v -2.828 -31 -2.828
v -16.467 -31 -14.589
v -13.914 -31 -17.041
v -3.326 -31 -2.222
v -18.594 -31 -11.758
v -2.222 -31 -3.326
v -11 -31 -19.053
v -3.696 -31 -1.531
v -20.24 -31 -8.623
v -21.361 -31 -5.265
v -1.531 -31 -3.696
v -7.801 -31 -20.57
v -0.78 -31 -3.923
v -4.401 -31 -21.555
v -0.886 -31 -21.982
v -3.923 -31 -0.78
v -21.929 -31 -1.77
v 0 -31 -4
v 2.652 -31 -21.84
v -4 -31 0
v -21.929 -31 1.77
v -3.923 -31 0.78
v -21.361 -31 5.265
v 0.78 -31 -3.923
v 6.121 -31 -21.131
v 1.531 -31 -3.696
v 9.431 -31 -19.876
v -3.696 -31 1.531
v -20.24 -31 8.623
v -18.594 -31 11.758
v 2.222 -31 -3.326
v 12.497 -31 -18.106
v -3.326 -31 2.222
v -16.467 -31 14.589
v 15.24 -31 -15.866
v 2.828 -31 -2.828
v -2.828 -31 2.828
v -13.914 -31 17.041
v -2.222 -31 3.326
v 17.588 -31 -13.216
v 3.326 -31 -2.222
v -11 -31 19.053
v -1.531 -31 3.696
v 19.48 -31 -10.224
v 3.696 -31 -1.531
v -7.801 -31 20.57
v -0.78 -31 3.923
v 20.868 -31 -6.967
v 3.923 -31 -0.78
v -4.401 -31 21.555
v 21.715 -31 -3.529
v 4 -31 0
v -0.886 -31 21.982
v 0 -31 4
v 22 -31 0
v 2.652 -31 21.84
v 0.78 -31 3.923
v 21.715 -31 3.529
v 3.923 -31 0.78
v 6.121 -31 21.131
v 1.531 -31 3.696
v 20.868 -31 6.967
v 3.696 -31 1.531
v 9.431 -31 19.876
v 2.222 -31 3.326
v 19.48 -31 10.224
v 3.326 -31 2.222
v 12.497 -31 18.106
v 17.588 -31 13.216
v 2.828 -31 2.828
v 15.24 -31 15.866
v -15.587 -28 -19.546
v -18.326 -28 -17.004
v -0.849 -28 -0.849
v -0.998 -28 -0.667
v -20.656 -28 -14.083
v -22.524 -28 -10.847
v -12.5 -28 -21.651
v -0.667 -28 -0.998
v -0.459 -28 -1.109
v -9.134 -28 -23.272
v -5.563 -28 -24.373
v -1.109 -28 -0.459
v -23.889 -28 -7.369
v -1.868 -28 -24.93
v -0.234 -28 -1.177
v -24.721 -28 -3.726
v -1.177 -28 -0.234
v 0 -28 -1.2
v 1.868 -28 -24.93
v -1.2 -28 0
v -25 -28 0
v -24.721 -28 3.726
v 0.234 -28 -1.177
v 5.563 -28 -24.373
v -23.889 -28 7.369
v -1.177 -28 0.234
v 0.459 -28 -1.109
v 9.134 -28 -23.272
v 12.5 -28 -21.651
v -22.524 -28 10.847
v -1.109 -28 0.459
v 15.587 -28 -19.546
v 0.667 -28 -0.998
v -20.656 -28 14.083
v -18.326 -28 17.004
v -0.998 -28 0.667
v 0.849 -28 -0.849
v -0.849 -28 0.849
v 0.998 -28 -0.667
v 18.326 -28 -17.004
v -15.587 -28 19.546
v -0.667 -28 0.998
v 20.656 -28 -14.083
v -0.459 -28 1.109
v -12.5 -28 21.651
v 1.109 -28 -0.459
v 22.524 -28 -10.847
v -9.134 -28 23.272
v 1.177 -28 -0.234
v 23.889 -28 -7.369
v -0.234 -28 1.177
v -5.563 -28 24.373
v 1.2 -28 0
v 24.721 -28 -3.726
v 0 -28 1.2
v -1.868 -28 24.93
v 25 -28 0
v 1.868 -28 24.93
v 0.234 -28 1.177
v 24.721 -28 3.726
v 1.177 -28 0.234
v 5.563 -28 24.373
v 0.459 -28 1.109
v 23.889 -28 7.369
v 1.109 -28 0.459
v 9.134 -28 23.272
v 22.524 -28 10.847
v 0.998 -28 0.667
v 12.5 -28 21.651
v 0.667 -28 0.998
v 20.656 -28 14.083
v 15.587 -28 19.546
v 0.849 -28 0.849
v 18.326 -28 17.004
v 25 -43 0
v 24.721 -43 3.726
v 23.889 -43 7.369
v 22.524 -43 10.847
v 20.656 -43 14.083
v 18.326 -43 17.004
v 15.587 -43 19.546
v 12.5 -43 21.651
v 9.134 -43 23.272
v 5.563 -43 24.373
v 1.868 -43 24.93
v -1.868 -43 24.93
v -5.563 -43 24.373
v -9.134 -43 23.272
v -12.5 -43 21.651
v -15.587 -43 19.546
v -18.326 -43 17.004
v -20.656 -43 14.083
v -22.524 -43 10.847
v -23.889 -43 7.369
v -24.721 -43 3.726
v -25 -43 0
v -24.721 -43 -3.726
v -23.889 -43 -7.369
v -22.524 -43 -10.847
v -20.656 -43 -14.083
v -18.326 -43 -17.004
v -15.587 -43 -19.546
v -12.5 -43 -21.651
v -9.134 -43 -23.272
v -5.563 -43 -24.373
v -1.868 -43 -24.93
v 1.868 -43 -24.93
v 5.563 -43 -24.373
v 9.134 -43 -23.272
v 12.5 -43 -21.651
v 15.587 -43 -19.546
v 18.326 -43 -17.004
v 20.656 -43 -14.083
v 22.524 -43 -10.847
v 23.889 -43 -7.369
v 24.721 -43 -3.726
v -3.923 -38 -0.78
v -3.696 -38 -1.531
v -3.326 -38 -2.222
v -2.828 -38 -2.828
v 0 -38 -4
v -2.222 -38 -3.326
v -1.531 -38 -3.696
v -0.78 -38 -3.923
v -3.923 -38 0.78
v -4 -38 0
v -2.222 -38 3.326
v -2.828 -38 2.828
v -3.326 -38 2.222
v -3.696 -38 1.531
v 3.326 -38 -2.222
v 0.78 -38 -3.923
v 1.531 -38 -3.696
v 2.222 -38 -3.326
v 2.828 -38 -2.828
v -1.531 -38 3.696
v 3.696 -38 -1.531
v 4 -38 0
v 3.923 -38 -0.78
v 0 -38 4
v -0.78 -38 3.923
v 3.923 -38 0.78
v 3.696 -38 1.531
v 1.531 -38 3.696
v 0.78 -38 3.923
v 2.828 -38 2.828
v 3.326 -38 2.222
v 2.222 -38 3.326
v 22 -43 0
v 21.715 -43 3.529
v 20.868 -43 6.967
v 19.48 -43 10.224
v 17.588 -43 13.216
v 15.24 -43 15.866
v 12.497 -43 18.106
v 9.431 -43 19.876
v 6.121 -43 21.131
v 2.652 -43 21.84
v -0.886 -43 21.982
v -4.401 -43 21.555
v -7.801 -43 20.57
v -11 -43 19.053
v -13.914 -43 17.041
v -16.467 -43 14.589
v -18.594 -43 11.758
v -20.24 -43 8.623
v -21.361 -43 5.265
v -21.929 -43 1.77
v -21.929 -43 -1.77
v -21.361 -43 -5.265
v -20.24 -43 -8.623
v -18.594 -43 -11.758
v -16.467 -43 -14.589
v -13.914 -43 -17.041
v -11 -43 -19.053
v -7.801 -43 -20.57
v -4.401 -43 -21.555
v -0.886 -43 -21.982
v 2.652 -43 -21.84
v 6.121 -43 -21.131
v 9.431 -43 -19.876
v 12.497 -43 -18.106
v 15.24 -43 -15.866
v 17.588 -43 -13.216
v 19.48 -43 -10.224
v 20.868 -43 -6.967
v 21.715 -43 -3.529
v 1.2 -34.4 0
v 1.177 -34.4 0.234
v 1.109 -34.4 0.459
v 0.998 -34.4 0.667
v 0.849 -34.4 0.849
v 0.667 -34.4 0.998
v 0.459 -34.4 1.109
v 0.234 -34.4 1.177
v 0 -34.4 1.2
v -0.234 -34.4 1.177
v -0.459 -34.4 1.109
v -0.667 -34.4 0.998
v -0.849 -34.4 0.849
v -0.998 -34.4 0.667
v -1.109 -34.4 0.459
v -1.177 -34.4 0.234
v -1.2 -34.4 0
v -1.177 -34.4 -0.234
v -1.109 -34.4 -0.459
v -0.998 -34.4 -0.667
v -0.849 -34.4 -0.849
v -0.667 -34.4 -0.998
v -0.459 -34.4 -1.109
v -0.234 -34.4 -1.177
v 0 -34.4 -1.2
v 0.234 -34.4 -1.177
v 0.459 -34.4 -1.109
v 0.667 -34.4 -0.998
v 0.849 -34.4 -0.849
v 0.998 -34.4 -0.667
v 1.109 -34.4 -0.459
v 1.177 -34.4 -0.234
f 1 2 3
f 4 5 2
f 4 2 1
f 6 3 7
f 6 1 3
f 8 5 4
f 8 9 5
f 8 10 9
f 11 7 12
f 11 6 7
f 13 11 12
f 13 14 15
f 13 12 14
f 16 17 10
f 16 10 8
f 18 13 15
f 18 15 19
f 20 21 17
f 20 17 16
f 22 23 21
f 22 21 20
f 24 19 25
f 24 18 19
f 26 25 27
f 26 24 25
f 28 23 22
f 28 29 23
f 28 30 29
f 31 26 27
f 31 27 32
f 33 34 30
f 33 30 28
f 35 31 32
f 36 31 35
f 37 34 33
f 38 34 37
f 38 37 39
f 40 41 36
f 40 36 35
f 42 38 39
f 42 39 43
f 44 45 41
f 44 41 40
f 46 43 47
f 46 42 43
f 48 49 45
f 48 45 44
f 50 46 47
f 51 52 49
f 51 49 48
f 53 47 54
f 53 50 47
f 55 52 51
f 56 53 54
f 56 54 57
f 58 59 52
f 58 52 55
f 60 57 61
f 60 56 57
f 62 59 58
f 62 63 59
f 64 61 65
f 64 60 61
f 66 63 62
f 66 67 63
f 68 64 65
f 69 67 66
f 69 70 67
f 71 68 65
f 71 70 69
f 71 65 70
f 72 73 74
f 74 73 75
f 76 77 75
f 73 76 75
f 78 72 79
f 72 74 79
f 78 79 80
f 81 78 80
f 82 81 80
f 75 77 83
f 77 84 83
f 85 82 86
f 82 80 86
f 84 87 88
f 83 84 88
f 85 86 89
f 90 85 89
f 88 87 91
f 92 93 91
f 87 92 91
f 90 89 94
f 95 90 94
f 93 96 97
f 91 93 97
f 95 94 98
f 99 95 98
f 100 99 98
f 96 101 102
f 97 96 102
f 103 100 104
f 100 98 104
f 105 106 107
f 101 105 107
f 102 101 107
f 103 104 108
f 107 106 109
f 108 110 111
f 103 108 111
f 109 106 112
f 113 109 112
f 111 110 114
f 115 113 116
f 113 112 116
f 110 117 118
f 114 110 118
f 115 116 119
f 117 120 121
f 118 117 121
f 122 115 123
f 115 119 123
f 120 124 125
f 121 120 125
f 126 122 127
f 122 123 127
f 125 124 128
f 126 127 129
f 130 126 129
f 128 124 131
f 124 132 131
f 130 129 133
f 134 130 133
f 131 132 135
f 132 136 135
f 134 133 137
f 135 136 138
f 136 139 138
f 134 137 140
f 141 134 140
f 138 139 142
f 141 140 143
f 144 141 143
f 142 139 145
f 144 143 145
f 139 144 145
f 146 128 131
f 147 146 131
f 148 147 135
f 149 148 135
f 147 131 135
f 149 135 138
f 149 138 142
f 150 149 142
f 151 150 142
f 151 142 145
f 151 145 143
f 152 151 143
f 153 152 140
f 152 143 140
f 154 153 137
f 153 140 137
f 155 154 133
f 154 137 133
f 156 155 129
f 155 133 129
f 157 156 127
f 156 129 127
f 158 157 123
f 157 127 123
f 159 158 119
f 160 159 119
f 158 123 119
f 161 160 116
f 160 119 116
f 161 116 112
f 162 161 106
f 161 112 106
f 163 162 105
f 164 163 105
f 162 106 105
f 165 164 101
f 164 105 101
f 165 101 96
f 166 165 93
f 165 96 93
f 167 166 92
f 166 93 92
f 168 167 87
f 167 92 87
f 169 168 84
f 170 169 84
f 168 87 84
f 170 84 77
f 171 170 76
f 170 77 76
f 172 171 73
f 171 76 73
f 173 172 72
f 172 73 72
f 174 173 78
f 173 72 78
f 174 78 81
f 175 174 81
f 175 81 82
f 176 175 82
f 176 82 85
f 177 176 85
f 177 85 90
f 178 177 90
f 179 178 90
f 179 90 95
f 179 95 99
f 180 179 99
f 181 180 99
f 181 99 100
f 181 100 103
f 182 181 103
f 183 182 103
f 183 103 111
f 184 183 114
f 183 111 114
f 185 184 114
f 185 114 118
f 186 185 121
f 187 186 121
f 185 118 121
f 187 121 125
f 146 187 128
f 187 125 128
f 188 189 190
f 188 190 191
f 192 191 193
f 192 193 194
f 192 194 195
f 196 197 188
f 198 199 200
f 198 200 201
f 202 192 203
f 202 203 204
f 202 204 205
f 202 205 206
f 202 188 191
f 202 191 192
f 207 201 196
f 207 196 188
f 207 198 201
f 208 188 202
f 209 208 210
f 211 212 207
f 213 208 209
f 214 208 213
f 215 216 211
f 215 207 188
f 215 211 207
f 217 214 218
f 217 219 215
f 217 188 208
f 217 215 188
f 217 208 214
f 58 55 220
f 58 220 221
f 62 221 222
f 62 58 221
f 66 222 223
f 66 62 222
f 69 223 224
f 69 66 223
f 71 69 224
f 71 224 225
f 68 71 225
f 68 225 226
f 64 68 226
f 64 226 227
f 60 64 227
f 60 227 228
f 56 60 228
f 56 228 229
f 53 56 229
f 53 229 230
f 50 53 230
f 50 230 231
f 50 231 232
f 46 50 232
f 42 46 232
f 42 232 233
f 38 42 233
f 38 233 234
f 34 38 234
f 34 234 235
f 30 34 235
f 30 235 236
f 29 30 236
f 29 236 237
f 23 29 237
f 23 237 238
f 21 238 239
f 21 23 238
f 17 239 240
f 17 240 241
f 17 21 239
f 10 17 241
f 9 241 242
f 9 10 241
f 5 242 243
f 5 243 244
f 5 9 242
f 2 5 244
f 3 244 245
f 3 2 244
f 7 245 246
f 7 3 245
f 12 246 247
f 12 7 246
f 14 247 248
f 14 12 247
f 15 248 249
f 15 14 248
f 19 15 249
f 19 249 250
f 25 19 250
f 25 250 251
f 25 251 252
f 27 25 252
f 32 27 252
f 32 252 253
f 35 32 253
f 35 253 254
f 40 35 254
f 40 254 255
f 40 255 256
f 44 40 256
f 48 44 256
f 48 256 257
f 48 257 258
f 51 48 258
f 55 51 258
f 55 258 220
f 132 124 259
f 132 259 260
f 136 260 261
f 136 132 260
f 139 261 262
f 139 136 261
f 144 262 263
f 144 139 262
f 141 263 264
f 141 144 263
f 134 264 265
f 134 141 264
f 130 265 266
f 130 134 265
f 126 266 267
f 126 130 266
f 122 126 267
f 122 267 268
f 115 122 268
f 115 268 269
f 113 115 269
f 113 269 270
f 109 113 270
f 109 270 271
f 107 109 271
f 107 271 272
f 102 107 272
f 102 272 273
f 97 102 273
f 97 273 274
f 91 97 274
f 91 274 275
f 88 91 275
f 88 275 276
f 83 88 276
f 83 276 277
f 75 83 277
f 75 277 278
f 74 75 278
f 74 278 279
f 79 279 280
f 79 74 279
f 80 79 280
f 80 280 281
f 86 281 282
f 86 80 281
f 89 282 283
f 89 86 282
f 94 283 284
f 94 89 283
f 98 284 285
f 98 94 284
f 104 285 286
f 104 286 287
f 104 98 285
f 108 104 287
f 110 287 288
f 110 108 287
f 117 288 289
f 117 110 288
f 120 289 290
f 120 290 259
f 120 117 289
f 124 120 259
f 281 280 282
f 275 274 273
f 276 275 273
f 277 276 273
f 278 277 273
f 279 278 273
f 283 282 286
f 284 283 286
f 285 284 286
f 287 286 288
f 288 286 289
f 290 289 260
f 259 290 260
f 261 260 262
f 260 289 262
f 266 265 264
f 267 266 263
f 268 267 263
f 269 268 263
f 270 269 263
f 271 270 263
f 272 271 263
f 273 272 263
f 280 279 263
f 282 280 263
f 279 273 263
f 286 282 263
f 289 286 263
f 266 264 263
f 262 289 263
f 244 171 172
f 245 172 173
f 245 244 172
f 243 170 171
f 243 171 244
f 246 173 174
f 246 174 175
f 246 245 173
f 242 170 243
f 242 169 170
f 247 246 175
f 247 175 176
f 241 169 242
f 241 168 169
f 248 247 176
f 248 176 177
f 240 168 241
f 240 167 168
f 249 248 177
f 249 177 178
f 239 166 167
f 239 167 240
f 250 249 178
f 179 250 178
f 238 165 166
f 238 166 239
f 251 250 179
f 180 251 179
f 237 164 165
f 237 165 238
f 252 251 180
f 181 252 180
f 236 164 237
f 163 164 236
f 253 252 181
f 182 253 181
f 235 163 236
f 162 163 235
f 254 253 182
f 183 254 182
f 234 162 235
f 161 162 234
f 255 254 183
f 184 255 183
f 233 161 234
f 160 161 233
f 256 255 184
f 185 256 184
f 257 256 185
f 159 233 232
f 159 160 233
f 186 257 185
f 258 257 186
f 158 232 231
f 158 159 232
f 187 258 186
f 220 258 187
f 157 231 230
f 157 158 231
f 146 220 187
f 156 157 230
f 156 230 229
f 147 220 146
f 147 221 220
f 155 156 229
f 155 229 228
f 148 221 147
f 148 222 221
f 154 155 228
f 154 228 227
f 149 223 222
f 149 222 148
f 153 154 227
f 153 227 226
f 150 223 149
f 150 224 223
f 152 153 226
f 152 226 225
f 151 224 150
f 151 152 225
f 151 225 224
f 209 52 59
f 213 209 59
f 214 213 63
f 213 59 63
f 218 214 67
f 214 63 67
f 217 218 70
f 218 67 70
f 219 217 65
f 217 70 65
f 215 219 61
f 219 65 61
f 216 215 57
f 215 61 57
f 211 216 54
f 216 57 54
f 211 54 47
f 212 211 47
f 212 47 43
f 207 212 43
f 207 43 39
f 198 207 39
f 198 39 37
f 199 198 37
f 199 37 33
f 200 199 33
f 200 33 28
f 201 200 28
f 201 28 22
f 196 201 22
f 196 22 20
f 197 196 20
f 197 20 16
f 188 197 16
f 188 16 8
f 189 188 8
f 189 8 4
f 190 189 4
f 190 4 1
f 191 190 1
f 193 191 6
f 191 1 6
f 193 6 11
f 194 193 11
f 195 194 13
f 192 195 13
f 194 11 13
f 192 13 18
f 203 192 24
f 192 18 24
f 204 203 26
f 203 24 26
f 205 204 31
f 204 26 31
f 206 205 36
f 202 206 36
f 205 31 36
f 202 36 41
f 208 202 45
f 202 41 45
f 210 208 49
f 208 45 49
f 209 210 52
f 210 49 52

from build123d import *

# Parameters (mm, degrees)
CYLINDER_R             = 1.2
CYLINDER_DEPTH         = 7.7
CYLINDER_ROLL_ANGLE    = 90
CYLINDER002_R          = 4
CYLINDER002_DEPTH      = 10
CYLINDER002_ROLL_ANGLE = 90
CYLINDER001_R          = 25
CYLINDER001_DEPTH      = 15
CYLINDER001_ROLL_ANGLE = 90
THICKNESS_T            = -3


with BuildPart() as motorshaft:
    # Cylinder → Cylinder (new body)
    with BuildSketch(Plane.XY):
        Circle(CYLINDER_R)
    extrude(amount=CYLINDER_DEPTH)


with BuildPart() as motorshaft_1:
    # Cylinder roll: moved
    add(motorshaft.part.rotate(Axis((0, 0, 0), (1, 0, 0)), CYLINDER_ROLL_ANGLE))


with BuildPart() as motorshaft_2:
    # Cylinder placement: moved
    add(motorshaft_1.part.moved(Location((0, -26.7, 0))))


with BuildPart() as shaft_holder_f:
    # Cylinder002 → Cylinder002 (new body)
    with BuildSketch(Plane.XY):
        Circle(CYLINDER002_R)
    extrude(amount=CYLINDER002_DEPTH)


with BuildPart() as shaft_holder_f_1:
    # Cylinder002 roll: moved
    add(shaft_holder_f.part.rotate(Axis((0, 0, 0), (1, 0, 0)), CYLINDER002_ROLL_ANGLE))


with BuildPart() as shaft_holder_f_2:
    # Cylinder002 placement: moved
    add(shaft_holder_f_1.part.moved(Location((0, -28, 0))))


with BuildPart() as wheel_shaft_hollow_f:
    # Cylinder001 → Cylinder001 (new body)
    with BuildSketch(Plane.XY):
        Circle(CYLINDER001_R)
    extrude(amount=CYLINDER001_DEPTH)


with BuildPart() as wheel_shaft_hollow_f_1:
    # Cylinder001 roll: moved
    add(wheel_shaft_hollow_f.part.rotate(Axis((0, 0, 0), (1, 0, 0)), CYLINDER001_ROLL_ANGLE))


with BuildPart() as wheel_shaft_hollow_f_2:
    # Cylinder001 placement: moved
    add(wheel_shaft_hollow_f_1.part.moved(Location((0, -28, 0))))

    # Thickness
    thickness_openings = [wheel_shaft_hollow_f_2.faces().sort_by_distance(p)[0] for p in [
        (0, -43, 0),
    ]]
    offset(amount=THICKNESS_T, openings=thickness_openings)

    # Fusion: union shaft_holder_f
    add(shaft_holder_f_2.part)

    # Cut: cut motorshaft
    add(motorshaft_2.part, mode=Mode.SUBTRACT)


solid = wheel_shaft_hollow_f_2.part
